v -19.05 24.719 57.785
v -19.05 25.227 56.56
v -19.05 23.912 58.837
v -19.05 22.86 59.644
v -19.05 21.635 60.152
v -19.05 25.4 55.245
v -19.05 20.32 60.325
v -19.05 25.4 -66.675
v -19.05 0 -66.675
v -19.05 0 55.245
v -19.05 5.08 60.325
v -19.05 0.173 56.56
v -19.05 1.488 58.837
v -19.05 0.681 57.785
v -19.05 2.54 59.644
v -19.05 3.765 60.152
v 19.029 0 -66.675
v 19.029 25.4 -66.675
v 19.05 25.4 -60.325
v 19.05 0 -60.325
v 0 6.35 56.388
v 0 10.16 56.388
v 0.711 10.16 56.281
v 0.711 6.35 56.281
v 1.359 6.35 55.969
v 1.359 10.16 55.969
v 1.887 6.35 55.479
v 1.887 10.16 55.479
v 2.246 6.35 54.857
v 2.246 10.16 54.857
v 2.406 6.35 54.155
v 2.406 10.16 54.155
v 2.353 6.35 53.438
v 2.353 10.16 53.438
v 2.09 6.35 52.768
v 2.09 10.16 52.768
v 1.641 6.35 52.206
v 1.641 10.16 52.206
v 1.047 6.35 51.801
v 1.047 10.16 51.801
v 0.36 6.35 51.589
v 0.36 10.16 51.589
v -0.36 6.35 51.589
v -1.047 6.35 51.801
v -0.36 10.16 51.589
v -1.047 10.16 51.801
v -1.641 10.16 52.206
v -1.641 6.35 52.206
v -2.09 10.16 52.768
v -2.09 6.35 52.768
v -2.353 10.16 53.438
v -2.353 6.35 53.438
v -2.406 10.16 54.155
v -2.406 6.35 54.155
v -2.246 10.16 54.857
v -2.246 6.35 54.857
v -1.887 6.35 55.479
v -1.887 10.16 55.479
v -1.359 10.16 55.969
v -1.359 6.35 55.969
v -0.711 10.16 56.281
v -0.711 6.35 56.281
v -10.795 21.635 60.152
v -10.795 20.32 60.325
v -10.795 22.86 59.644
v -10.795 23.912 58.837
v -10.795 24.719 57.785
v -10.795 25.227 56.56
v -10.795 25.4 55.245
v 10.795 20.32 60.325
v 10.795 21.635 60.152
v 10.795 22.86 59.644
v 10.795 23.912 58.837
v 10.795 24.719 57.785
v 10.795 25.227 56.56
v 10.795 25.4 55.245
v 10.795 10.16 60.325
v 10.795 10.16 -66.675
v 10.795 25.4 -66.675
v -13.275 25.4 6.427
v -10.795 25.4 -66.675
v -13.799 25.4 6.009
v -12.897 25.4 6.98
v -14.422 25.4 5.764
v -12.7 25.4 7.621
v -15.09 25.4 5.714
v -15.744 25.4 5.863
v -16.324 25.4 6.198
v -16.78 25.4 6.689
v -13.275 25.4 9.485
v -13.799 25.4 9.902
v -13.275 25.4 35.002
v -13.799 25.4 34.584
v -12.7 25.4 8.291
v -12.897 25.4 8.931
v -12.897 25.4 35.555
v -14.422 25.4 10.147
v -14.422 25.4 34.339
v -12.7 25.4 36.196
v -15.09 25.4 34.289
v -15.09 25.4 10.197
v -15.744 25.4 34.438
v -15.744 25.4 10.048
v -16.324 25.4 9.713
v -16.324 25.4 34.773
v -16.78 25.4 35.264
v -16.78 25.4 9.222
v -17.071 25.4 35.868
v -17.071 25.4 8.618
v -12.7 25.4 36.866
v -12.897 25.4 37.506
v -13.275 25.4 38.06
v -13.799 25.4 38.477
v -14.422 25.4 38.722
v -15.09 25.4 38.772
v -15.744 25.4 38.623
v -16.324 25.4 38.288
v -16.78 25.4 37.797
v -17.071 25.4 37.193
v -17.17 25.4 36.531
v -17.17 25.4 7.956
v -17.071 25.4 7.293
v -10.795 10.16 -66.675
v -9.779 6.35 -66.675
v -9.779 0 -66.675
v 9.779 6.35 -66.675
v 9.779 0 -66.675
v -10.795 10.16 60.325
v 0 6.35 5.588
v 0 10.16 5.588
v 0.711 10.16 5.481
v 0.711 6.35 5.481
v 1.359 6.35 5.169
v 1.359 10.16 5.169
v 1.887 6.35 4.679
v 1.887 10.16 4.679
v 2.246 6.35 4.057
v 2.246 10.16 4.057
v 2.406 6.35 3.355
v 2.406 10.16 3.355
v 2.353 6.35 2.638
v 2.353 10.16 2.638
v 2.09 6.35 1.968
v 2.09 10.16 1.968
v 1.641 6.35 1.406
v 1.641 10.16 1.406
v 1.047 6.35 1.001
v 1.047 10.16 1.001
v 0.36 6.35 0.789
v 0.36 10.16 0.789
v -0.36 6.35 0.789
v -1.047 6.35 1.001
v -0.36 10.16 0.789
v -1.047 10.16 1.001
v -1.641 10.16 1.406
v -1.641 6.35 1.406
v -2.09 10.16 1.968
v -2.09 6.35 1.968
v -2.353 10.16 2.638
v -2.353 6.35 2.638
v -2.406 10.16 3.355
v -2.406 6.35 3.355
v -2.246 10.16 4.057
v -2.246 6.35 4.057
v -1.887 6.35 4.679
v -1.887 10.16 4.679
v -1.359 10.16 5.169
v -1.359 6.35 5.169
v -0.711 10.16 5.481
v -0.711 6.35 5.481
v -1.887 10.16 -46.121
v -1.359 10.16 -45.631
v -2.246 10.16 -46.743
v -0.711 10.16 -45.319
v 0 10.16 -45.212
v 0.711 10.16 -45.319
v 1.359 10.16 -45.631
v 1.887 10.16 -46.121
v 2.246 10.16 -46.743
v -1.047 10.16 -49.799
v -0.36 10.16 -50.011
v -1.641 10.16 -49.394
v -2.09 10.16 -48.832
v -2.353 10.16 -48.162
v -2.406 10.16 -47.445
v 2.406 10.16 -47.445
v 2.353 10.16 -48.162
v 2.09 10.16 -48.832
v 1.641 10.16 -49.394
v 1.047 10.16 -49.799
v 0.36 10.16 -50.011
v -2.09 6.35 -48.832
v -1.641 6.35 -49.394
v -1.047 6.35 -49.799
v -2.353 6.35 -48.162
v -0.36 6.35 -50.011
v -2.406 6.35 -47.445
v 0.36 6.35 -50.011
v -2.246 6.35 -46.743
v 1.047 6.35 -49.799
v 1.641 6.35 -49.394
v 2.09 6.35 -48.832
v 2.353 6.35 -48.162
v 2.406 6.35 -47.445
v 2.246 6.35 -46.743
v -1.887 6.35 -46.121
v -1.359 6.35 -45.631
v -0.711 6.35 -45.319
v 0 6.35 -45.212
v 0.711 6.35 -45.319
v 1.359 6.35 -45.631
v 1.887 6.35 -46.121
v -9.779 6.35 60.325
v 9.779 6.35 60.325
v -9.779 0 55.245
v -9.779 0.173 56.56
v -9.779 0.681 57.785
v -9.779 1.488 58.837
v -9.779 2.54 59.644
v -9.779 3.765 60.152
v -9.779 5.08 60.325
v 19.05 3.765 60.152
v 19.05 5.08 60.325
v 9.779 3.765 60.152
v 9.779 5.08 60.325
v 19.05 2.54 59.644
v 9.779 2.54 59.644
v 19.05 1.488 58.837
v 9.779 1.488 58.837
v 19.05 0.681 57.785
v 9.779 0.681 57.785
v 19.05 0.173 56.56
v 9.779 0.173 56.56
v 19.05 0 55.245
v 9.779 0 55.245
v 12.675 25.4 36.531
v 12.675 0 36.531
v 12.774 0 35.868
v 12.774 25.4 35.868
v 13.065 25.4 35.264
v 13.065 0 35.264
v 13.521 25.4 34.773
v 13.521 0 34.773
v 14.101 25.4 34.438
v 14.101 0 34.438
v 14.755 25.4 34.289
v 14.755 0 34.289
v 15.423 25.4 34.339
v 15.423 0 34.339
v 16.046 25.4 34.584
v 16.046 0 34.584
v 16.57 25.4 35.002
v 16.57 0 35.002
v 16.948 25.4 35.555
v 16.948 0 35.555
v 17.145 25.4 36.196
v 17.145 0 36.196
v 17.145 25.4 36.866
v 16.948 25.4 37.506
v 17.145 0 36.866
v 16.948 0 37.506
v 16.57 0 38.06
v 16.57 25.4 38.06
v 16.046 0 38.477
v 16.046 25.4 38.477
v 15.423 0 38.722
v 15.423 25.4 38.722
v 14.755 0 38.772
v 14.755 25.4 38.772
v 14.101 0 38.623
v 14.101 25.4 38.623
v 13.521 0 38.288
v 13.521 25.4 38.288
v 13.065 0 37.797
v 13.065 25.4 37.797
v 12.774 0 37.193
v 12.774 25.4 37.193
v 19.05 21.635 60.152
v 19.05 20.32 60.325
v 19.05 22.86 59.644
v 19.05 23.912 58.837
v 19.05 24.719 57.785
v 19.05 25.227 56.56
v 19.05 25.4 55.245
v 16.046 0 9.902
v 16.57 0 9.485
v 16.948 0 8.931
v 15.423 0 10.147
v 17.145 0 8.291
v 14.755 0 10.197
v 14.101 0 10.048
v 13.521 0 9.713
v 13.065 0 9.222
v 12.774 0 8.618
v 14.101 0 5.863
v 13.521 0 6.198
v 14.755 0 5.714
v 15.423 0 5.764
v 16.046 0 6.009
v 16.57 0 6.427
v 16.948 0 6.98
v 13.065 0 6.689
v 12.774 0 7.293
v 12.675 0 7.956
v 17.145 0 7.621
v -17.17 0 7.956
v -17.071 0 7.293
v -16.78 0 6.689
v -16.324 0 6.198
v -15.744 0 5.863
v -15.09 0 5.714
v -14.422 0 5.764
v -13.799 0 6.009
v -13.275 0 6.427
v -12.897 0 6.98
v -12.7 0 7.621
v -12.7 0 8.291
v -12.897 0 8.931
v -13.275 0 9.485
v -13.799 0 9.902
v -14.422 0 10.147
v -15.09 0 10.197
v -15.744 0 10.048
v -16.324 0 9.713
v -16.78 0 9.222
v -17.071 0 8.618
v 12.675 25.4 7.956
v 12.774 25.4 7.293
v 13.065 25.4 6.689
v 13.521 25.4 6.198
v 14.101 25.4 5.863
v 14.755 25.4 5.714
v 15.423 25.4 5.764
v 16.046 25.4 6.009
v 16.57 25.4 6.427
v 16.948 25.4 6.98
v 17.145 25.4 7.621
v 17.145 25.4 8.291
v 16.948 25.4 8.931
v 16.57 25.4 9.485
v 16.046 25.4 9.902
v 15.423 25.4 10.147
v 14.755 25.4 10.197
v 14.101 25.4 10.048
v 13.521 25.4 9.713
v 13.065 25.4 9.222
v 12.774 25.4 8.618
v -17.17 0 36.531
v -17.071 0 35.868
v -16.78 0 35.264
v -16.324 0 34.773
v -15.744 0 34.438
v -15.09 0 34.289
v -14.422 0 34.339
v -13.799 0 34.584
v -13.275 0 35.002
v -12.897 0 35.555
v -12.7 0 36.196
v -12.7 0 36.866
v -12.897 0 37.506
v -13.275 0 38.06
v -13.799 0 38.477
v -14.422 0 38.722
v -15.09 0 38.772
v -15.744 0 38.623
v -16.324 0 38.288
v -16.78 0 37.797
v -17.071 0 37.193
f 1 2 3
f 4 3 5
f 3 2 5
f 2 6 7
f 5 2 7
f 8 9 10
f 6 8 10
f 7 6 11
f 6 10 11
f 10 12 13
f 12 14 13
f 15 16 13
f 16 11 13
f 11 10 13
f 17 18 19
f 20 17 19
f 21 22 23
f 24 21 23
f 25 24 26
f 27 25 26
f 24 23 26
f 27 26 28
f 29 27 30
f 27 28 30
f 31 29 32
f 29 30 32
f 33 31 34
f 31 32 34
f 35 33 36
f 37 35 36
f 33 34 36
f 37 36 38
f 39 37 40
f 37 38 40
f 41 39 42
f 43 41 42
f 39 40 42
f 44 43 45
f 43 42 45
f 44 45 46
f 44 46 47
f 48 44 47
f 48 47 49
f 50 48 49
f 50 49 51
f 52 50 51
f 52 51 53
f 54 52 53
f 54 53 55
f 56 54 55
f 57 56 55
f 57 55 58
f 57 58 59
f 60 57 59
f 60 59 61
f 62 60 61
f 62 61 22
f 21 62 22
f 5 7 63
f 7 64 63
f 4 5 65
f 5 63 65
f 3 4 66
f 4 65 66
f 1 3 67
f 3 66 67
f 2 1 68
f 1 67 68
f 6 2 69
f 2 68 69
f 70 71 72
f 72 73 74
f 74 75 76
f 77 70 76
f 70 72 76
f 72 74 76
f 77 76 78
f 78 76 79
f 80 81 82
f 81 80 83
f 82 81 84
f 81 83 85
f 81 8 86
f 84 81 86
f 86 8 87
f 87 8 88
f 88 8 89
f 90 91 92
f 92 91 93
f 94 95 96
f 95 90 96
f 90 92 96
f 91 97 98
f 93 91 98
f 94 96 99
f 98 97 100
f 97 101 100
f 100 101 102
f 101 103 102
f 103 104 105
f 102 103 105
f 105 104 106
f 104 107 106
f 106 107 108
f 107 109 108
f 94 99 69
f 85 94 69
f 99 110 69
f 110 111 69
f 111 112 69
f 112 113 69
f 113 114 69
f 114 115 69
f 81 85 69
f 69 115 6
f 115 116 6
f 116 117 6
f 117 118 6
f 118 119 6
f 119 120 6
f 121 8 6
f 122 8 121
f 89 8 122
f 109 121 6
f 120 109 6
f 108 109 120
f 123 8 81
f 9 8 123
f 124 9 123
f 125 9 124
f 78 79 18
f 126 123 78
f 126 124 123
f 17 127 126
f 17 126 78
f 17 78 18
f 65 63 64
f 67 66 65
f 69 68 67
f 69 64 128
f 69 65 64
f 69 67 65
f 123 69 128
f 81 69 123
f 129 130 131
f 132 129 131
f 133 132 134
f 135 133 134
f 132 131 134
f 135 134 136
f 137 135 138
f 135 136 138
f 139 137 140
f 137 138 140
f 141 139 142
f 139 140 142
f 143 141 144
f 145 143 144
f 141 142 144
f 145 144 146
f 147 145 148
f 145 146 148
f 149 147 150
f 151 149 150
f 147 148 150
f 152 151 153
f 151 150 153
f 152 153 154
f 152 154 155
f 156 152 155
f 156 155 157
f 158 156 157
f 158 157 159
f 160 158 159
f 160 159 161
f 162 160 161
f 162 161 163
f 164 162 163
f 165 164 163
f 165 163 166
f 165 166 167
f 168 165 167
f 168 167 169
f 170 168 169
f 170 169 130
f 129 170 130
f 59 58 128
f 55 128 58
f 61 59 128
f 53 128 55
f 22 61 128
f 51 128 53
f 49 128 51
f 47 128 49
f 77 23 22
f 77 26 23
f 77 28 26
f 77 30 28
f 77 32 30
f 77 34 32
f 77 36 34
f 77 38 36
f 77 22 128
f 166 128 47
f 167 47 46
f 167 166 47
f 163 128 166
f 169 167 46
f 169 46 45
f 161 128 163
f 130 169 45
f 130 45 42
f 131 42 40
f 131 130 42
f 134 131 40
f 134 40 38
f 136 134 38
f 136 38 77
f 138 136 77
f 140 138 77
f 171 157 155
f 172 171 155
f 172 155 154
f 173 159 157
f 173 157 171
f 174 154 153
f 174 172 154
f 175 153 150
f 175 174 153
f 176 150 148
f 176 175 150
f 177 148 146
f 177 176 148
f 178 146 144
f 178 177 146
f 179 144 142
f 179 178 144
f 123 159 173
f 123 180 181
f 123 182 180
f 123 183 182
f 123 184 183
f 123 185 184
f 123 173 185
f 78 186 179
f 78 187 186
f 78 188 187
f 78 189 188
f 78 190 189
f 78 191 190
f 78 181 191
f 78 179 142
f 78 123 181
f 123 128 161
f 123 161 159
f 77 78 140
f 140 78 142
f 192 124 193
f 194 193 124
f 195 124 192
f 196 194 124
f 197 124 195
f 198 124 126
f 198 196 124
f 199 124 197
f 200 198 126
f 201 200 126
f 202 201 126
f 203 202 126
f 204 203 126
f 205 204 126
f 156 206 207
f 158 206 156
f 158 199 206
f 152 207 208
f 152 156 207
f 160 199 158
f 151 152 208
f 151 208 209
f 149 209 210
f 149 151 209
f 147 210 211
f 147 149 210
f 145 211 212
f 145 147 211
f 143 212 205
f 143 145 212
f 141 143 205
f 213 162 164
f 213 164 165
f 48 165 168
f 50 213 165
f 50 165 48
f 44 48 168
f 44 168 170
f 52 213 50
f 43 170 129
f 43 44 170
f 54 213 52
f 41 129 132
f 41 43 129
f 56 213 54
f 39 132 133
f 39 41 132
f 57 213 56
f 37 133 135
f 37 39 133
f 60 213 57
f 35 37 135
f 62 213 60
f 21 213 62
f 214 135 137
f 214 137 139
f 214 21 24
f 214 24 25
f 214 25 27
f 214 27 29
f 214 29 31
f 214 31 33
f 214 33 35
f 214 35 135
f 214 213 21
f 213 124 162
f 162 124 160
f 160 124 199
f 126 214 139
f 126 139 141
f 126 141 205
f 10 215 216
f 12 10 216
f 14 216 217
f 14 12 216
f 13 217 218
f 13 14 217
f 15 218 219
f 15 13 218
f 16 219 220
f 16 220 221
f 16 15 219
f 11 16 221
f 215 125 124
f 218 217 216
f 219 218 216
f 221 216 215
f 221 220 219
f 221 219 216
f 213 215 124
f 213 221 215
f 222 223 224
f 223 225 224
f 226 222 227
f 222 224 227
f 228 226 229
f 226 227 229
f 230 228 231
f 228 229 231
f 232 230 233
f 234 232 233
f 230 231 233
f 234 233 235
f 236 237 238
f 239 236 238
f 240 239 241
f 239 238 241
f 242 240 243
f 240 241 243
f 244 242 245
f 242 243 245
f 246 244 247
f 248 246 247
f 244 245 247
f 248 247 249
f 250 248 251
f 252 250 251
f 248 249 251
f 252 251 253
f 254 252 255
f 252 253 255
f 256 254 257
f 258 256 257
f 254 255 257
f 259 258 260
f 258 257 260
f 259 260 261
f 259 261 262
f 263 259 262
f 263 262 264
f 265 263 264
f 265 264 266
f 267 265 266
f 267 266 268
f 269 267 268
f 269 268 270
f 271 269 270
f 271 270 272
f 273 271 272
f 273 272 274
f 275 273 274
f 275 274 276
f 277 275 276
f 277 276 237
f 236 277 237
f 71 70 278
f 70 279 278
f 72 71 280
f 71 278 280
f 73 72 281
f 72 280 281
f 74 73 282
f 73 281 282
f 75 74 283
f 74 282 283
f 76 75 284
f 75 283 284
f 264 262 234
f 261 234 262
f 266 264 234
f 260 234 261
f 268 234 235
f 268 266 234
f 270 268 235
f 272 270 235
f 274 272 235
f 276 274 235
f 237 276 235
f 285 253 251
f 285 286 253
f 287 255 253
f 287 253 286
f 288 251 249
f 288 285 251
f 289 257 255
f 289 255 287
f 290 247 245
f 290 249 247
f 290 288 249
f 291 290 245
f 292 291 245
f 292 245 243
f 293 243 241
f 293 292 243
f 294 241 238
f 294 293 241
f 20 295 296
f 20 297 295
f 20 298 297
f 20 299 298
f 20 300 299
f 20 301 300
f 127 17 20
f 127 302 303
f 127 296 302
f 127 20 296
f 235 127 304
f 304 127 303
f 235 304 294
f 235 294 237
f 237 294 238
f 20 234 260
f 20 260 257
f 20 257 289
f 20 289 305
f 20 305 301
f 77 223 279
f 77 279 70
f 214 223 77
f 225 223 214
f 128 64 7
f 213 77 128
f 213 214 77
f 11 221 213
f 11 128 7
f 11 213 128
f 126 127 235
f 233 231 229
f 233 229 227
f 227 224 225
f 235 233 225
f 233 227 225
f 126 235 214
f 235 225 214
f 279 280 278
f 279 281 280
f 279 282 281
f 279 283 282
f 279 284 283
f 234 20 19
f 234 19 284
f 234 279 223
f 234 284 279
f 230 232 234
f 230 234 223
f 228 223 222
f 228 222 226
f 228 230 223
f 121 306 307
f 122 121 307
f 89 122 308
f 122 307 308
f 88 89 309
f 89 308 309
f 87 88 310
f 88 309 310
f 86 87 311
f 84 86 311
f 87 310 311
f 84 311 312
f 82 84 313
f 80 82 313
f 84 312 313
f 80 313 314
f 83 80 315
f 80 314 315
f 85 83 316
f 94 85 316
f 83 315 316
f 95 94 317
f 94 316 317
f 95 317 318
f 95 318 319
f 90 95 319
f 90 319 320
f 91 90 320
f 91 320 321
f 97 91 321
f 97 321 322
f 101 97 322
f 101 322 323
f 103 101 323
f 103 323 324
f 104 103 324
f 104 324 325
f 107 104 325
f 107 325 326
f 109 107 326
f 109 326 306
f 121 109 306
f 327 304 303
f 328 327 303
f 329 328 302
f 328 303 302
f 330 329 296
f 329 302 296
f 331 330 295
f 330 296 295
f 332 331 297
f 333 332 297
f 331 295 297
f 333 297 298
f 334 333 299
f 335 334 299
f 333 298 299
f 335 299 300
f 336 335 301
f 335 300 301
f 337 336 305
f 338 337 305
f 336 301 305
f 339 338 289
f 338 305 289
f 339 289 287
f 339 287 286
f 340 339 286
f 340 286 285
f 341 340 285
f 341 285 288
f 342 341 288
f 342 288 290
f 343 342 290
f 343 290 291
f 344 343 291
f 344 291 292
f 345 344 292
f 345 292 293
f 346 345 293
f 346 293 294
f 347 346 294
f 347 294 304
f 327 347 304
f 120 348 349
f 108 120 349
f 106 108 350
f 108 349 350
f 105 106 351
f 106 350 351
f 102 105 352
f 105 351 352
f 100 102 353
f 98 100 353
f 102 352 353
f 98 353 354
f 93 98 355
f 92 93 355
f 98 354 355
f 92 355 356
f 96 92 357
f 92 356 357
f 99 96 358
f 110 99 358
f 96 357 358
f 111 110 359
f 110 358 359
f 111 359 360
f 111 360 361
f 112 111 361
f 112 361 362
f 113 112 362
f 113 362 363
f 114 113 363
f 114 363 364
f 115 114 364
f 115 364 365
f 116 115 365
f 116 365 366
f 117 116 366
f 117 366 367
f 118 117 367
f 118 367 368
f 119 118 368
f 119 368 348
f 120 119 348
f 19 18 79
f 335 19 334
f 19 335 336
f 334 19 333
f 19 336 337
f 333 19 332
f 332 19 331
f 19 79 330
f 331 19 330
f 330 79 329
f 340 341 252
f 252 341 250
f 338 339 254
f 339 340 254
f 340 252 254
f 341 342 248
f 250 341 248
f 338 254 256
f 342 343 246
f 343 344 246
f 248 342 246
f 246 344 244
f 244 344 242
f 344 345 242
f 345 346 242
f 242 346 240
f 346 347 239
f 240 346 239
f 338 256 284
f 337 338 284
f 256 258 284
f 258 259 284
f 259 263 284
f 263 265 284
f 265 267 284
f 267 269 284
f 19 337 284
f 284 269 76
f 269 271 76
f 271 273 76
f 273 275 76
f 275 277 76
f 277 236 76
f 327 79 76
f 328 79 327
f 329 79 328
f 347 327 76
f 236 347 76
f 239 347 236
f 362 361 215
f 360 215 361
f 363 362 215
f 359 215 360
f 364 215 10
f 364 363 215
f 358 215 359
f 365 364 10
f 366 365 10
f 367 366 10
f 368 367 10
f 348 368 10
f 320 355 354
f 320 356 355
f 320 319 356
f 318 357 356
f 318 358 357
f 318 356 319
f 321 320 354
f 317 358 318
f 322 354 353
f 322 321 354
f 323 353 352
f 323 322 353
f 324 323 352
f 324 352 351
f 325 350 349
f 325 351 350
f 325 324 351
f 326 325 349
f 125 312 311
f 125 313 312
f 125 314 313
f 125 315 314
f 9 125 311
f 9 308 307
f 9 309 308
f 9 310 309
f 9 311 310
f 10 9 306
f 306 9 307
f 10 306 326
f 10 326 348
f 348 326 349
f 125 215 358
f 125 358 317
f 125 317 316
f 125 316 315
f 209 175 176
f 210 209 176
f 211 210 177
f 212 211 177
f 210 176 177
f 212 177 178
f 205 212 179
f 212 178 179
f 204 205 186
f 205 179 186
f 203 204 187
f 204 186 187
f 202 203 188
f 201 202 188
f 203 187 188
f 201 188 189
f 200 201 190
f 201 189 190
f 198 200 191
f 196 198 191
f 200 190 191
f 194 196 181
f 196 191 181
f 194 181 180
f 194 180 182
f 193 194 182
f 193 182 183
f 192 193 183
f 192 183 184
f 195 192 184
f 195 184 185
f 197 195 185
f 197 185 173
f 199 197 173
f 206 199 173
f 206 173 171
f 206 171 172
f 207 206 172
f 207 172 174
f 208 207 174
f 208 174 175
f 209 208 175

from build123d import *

# Parameters (mm, degrees)
BOSS_EXTRUDE1_DEPTH   = 38.1
SKETCH2_W             = 21.59
SKETCH2_H             = 254
CUT_EXTRUDE1_DEPTH    = 27.94
CUT_EXTRUDE8_DEPTH    = 86.725
SKETCH12_W            = 19.558
SKETCH12_H            = 12.7
CUT_EXTRUDE9_DEPTH    = 131.908603613
SKETCH13_R            = 2.413
CUT_EXTRUDE10_DEPTH   = 71.997998035
F_8_CLEARANCE_HOLE1_D = 4.4958
FILLET2_R             = 5.08


with BuildPart() as part:
    # Sketch1 → Boss-Extrude1 (new body)
    with BuildSketch(Plane(origin=(0, 0, 0), x_dir=(1, 0, 0), z_dir=(0, 1, 0))):
        Polygon((-19.05, 60.325), (-19.05, 66.675), (19.029461499, 66.675), (19.05, 60.325), (19.05, -60.325), (-19.05, -60.325), align=None)
    extrude(amount=BOSS_EXTRUDE1_DEPTH)

    # Sketch2 → Cut-Extrude1 (cut)
    with BuildSketch(Plane(origin=(0, 38.1, 0), x_dir=(1, 0, 0), z_dir=(0, 1, 0))):
        with Locations((0, -31.75)):
            Rectangle(SKETCH2_W, SKETCH2_H)
    extrude(amount=-CUT_EXTRUDE1_DEPTH, mode=Mode.SUBTRACT)

    # Sketch11 → Cut-Extrude8 (cut, through all)
    with BuildSketch(Plane.ZY.offset(19.05)):
        Polygon((60.325, 25.4), (35.000755529, 25.4), (21.802528375, 25.4), (-28.499244471, 25.4), (-41.697471625, 25.4), (-60.498358048, 25.4), (-66.675, 25.4), (-71.377274135, 25.4), (-71.377274135, 38.1), (-66.675, 38.1), (-60.498358048, 38.1), (60.325, 38.1), align=None)
    extrude(amount=-CUT_EXTRUDE8_DEPTH, mode=Mode.SUBTRACT)

    # Sketch12 → Cut-Extrude9 (cut, through all)
    with BuildSketch(Plane.XY.offset(60.325)):
        Rectangle(SKETCH12_W, SKETCH12_H)
    extrude(amount=-CUT_EXTRUDE9_DEPTH, mode=Mode.SUBTRACT)

    # Sketch13 → Cut-Extrude10 (cut, through all)
    with BuildSketch(Plane(origin=(0, 10.16, 0), x_dir=(1, 0, 0), z_dir=(0, 1, 0))):
        with Locations(Location((0, -53.975, 0), (0, 0, 270))):
            Circle(SKETCH13_R)
        with Locations(Location((0, 47.625, 0), (0, 0, 270))):
            Circle(SKETCH13_R)
        with Locations(Location((0, -3.175, 0), (0, 0, 270))):
            Circle(SKETCH13_R)
    extrude(amount=-CUT_EXTRUDE10_DEPTH, mode=Mode.SUBTRACT)

    # #8 Clearance Hole1 (through all)
    with Locations(Plane(origin=(0, 25.4, 0), x_dir=(1, 0, 0), z_dir=(0, 1, 0))):
        with Locations((-14.9225, -36.530628157), (-14.9225, -7.955628157), (14.9225, -7.955628157), (14.9225, -36.530628157)):
            Hole(F_8_CLEARANCE_HOLE1_D / 2)

    # Fillet2
    fillet2_edges = [part.edges().sort_by_distance(p)[0] for p in [
        (14.4145, 0, 60.325),
        (14.9225, 25.4, 60.325),
        (-14.9225, 25.4, 60.325),
        (-14.4145, 0, 60.325),
    ]]
    fillet(fillet2_edges, radius=FILLET2_R)


solid = part.part
